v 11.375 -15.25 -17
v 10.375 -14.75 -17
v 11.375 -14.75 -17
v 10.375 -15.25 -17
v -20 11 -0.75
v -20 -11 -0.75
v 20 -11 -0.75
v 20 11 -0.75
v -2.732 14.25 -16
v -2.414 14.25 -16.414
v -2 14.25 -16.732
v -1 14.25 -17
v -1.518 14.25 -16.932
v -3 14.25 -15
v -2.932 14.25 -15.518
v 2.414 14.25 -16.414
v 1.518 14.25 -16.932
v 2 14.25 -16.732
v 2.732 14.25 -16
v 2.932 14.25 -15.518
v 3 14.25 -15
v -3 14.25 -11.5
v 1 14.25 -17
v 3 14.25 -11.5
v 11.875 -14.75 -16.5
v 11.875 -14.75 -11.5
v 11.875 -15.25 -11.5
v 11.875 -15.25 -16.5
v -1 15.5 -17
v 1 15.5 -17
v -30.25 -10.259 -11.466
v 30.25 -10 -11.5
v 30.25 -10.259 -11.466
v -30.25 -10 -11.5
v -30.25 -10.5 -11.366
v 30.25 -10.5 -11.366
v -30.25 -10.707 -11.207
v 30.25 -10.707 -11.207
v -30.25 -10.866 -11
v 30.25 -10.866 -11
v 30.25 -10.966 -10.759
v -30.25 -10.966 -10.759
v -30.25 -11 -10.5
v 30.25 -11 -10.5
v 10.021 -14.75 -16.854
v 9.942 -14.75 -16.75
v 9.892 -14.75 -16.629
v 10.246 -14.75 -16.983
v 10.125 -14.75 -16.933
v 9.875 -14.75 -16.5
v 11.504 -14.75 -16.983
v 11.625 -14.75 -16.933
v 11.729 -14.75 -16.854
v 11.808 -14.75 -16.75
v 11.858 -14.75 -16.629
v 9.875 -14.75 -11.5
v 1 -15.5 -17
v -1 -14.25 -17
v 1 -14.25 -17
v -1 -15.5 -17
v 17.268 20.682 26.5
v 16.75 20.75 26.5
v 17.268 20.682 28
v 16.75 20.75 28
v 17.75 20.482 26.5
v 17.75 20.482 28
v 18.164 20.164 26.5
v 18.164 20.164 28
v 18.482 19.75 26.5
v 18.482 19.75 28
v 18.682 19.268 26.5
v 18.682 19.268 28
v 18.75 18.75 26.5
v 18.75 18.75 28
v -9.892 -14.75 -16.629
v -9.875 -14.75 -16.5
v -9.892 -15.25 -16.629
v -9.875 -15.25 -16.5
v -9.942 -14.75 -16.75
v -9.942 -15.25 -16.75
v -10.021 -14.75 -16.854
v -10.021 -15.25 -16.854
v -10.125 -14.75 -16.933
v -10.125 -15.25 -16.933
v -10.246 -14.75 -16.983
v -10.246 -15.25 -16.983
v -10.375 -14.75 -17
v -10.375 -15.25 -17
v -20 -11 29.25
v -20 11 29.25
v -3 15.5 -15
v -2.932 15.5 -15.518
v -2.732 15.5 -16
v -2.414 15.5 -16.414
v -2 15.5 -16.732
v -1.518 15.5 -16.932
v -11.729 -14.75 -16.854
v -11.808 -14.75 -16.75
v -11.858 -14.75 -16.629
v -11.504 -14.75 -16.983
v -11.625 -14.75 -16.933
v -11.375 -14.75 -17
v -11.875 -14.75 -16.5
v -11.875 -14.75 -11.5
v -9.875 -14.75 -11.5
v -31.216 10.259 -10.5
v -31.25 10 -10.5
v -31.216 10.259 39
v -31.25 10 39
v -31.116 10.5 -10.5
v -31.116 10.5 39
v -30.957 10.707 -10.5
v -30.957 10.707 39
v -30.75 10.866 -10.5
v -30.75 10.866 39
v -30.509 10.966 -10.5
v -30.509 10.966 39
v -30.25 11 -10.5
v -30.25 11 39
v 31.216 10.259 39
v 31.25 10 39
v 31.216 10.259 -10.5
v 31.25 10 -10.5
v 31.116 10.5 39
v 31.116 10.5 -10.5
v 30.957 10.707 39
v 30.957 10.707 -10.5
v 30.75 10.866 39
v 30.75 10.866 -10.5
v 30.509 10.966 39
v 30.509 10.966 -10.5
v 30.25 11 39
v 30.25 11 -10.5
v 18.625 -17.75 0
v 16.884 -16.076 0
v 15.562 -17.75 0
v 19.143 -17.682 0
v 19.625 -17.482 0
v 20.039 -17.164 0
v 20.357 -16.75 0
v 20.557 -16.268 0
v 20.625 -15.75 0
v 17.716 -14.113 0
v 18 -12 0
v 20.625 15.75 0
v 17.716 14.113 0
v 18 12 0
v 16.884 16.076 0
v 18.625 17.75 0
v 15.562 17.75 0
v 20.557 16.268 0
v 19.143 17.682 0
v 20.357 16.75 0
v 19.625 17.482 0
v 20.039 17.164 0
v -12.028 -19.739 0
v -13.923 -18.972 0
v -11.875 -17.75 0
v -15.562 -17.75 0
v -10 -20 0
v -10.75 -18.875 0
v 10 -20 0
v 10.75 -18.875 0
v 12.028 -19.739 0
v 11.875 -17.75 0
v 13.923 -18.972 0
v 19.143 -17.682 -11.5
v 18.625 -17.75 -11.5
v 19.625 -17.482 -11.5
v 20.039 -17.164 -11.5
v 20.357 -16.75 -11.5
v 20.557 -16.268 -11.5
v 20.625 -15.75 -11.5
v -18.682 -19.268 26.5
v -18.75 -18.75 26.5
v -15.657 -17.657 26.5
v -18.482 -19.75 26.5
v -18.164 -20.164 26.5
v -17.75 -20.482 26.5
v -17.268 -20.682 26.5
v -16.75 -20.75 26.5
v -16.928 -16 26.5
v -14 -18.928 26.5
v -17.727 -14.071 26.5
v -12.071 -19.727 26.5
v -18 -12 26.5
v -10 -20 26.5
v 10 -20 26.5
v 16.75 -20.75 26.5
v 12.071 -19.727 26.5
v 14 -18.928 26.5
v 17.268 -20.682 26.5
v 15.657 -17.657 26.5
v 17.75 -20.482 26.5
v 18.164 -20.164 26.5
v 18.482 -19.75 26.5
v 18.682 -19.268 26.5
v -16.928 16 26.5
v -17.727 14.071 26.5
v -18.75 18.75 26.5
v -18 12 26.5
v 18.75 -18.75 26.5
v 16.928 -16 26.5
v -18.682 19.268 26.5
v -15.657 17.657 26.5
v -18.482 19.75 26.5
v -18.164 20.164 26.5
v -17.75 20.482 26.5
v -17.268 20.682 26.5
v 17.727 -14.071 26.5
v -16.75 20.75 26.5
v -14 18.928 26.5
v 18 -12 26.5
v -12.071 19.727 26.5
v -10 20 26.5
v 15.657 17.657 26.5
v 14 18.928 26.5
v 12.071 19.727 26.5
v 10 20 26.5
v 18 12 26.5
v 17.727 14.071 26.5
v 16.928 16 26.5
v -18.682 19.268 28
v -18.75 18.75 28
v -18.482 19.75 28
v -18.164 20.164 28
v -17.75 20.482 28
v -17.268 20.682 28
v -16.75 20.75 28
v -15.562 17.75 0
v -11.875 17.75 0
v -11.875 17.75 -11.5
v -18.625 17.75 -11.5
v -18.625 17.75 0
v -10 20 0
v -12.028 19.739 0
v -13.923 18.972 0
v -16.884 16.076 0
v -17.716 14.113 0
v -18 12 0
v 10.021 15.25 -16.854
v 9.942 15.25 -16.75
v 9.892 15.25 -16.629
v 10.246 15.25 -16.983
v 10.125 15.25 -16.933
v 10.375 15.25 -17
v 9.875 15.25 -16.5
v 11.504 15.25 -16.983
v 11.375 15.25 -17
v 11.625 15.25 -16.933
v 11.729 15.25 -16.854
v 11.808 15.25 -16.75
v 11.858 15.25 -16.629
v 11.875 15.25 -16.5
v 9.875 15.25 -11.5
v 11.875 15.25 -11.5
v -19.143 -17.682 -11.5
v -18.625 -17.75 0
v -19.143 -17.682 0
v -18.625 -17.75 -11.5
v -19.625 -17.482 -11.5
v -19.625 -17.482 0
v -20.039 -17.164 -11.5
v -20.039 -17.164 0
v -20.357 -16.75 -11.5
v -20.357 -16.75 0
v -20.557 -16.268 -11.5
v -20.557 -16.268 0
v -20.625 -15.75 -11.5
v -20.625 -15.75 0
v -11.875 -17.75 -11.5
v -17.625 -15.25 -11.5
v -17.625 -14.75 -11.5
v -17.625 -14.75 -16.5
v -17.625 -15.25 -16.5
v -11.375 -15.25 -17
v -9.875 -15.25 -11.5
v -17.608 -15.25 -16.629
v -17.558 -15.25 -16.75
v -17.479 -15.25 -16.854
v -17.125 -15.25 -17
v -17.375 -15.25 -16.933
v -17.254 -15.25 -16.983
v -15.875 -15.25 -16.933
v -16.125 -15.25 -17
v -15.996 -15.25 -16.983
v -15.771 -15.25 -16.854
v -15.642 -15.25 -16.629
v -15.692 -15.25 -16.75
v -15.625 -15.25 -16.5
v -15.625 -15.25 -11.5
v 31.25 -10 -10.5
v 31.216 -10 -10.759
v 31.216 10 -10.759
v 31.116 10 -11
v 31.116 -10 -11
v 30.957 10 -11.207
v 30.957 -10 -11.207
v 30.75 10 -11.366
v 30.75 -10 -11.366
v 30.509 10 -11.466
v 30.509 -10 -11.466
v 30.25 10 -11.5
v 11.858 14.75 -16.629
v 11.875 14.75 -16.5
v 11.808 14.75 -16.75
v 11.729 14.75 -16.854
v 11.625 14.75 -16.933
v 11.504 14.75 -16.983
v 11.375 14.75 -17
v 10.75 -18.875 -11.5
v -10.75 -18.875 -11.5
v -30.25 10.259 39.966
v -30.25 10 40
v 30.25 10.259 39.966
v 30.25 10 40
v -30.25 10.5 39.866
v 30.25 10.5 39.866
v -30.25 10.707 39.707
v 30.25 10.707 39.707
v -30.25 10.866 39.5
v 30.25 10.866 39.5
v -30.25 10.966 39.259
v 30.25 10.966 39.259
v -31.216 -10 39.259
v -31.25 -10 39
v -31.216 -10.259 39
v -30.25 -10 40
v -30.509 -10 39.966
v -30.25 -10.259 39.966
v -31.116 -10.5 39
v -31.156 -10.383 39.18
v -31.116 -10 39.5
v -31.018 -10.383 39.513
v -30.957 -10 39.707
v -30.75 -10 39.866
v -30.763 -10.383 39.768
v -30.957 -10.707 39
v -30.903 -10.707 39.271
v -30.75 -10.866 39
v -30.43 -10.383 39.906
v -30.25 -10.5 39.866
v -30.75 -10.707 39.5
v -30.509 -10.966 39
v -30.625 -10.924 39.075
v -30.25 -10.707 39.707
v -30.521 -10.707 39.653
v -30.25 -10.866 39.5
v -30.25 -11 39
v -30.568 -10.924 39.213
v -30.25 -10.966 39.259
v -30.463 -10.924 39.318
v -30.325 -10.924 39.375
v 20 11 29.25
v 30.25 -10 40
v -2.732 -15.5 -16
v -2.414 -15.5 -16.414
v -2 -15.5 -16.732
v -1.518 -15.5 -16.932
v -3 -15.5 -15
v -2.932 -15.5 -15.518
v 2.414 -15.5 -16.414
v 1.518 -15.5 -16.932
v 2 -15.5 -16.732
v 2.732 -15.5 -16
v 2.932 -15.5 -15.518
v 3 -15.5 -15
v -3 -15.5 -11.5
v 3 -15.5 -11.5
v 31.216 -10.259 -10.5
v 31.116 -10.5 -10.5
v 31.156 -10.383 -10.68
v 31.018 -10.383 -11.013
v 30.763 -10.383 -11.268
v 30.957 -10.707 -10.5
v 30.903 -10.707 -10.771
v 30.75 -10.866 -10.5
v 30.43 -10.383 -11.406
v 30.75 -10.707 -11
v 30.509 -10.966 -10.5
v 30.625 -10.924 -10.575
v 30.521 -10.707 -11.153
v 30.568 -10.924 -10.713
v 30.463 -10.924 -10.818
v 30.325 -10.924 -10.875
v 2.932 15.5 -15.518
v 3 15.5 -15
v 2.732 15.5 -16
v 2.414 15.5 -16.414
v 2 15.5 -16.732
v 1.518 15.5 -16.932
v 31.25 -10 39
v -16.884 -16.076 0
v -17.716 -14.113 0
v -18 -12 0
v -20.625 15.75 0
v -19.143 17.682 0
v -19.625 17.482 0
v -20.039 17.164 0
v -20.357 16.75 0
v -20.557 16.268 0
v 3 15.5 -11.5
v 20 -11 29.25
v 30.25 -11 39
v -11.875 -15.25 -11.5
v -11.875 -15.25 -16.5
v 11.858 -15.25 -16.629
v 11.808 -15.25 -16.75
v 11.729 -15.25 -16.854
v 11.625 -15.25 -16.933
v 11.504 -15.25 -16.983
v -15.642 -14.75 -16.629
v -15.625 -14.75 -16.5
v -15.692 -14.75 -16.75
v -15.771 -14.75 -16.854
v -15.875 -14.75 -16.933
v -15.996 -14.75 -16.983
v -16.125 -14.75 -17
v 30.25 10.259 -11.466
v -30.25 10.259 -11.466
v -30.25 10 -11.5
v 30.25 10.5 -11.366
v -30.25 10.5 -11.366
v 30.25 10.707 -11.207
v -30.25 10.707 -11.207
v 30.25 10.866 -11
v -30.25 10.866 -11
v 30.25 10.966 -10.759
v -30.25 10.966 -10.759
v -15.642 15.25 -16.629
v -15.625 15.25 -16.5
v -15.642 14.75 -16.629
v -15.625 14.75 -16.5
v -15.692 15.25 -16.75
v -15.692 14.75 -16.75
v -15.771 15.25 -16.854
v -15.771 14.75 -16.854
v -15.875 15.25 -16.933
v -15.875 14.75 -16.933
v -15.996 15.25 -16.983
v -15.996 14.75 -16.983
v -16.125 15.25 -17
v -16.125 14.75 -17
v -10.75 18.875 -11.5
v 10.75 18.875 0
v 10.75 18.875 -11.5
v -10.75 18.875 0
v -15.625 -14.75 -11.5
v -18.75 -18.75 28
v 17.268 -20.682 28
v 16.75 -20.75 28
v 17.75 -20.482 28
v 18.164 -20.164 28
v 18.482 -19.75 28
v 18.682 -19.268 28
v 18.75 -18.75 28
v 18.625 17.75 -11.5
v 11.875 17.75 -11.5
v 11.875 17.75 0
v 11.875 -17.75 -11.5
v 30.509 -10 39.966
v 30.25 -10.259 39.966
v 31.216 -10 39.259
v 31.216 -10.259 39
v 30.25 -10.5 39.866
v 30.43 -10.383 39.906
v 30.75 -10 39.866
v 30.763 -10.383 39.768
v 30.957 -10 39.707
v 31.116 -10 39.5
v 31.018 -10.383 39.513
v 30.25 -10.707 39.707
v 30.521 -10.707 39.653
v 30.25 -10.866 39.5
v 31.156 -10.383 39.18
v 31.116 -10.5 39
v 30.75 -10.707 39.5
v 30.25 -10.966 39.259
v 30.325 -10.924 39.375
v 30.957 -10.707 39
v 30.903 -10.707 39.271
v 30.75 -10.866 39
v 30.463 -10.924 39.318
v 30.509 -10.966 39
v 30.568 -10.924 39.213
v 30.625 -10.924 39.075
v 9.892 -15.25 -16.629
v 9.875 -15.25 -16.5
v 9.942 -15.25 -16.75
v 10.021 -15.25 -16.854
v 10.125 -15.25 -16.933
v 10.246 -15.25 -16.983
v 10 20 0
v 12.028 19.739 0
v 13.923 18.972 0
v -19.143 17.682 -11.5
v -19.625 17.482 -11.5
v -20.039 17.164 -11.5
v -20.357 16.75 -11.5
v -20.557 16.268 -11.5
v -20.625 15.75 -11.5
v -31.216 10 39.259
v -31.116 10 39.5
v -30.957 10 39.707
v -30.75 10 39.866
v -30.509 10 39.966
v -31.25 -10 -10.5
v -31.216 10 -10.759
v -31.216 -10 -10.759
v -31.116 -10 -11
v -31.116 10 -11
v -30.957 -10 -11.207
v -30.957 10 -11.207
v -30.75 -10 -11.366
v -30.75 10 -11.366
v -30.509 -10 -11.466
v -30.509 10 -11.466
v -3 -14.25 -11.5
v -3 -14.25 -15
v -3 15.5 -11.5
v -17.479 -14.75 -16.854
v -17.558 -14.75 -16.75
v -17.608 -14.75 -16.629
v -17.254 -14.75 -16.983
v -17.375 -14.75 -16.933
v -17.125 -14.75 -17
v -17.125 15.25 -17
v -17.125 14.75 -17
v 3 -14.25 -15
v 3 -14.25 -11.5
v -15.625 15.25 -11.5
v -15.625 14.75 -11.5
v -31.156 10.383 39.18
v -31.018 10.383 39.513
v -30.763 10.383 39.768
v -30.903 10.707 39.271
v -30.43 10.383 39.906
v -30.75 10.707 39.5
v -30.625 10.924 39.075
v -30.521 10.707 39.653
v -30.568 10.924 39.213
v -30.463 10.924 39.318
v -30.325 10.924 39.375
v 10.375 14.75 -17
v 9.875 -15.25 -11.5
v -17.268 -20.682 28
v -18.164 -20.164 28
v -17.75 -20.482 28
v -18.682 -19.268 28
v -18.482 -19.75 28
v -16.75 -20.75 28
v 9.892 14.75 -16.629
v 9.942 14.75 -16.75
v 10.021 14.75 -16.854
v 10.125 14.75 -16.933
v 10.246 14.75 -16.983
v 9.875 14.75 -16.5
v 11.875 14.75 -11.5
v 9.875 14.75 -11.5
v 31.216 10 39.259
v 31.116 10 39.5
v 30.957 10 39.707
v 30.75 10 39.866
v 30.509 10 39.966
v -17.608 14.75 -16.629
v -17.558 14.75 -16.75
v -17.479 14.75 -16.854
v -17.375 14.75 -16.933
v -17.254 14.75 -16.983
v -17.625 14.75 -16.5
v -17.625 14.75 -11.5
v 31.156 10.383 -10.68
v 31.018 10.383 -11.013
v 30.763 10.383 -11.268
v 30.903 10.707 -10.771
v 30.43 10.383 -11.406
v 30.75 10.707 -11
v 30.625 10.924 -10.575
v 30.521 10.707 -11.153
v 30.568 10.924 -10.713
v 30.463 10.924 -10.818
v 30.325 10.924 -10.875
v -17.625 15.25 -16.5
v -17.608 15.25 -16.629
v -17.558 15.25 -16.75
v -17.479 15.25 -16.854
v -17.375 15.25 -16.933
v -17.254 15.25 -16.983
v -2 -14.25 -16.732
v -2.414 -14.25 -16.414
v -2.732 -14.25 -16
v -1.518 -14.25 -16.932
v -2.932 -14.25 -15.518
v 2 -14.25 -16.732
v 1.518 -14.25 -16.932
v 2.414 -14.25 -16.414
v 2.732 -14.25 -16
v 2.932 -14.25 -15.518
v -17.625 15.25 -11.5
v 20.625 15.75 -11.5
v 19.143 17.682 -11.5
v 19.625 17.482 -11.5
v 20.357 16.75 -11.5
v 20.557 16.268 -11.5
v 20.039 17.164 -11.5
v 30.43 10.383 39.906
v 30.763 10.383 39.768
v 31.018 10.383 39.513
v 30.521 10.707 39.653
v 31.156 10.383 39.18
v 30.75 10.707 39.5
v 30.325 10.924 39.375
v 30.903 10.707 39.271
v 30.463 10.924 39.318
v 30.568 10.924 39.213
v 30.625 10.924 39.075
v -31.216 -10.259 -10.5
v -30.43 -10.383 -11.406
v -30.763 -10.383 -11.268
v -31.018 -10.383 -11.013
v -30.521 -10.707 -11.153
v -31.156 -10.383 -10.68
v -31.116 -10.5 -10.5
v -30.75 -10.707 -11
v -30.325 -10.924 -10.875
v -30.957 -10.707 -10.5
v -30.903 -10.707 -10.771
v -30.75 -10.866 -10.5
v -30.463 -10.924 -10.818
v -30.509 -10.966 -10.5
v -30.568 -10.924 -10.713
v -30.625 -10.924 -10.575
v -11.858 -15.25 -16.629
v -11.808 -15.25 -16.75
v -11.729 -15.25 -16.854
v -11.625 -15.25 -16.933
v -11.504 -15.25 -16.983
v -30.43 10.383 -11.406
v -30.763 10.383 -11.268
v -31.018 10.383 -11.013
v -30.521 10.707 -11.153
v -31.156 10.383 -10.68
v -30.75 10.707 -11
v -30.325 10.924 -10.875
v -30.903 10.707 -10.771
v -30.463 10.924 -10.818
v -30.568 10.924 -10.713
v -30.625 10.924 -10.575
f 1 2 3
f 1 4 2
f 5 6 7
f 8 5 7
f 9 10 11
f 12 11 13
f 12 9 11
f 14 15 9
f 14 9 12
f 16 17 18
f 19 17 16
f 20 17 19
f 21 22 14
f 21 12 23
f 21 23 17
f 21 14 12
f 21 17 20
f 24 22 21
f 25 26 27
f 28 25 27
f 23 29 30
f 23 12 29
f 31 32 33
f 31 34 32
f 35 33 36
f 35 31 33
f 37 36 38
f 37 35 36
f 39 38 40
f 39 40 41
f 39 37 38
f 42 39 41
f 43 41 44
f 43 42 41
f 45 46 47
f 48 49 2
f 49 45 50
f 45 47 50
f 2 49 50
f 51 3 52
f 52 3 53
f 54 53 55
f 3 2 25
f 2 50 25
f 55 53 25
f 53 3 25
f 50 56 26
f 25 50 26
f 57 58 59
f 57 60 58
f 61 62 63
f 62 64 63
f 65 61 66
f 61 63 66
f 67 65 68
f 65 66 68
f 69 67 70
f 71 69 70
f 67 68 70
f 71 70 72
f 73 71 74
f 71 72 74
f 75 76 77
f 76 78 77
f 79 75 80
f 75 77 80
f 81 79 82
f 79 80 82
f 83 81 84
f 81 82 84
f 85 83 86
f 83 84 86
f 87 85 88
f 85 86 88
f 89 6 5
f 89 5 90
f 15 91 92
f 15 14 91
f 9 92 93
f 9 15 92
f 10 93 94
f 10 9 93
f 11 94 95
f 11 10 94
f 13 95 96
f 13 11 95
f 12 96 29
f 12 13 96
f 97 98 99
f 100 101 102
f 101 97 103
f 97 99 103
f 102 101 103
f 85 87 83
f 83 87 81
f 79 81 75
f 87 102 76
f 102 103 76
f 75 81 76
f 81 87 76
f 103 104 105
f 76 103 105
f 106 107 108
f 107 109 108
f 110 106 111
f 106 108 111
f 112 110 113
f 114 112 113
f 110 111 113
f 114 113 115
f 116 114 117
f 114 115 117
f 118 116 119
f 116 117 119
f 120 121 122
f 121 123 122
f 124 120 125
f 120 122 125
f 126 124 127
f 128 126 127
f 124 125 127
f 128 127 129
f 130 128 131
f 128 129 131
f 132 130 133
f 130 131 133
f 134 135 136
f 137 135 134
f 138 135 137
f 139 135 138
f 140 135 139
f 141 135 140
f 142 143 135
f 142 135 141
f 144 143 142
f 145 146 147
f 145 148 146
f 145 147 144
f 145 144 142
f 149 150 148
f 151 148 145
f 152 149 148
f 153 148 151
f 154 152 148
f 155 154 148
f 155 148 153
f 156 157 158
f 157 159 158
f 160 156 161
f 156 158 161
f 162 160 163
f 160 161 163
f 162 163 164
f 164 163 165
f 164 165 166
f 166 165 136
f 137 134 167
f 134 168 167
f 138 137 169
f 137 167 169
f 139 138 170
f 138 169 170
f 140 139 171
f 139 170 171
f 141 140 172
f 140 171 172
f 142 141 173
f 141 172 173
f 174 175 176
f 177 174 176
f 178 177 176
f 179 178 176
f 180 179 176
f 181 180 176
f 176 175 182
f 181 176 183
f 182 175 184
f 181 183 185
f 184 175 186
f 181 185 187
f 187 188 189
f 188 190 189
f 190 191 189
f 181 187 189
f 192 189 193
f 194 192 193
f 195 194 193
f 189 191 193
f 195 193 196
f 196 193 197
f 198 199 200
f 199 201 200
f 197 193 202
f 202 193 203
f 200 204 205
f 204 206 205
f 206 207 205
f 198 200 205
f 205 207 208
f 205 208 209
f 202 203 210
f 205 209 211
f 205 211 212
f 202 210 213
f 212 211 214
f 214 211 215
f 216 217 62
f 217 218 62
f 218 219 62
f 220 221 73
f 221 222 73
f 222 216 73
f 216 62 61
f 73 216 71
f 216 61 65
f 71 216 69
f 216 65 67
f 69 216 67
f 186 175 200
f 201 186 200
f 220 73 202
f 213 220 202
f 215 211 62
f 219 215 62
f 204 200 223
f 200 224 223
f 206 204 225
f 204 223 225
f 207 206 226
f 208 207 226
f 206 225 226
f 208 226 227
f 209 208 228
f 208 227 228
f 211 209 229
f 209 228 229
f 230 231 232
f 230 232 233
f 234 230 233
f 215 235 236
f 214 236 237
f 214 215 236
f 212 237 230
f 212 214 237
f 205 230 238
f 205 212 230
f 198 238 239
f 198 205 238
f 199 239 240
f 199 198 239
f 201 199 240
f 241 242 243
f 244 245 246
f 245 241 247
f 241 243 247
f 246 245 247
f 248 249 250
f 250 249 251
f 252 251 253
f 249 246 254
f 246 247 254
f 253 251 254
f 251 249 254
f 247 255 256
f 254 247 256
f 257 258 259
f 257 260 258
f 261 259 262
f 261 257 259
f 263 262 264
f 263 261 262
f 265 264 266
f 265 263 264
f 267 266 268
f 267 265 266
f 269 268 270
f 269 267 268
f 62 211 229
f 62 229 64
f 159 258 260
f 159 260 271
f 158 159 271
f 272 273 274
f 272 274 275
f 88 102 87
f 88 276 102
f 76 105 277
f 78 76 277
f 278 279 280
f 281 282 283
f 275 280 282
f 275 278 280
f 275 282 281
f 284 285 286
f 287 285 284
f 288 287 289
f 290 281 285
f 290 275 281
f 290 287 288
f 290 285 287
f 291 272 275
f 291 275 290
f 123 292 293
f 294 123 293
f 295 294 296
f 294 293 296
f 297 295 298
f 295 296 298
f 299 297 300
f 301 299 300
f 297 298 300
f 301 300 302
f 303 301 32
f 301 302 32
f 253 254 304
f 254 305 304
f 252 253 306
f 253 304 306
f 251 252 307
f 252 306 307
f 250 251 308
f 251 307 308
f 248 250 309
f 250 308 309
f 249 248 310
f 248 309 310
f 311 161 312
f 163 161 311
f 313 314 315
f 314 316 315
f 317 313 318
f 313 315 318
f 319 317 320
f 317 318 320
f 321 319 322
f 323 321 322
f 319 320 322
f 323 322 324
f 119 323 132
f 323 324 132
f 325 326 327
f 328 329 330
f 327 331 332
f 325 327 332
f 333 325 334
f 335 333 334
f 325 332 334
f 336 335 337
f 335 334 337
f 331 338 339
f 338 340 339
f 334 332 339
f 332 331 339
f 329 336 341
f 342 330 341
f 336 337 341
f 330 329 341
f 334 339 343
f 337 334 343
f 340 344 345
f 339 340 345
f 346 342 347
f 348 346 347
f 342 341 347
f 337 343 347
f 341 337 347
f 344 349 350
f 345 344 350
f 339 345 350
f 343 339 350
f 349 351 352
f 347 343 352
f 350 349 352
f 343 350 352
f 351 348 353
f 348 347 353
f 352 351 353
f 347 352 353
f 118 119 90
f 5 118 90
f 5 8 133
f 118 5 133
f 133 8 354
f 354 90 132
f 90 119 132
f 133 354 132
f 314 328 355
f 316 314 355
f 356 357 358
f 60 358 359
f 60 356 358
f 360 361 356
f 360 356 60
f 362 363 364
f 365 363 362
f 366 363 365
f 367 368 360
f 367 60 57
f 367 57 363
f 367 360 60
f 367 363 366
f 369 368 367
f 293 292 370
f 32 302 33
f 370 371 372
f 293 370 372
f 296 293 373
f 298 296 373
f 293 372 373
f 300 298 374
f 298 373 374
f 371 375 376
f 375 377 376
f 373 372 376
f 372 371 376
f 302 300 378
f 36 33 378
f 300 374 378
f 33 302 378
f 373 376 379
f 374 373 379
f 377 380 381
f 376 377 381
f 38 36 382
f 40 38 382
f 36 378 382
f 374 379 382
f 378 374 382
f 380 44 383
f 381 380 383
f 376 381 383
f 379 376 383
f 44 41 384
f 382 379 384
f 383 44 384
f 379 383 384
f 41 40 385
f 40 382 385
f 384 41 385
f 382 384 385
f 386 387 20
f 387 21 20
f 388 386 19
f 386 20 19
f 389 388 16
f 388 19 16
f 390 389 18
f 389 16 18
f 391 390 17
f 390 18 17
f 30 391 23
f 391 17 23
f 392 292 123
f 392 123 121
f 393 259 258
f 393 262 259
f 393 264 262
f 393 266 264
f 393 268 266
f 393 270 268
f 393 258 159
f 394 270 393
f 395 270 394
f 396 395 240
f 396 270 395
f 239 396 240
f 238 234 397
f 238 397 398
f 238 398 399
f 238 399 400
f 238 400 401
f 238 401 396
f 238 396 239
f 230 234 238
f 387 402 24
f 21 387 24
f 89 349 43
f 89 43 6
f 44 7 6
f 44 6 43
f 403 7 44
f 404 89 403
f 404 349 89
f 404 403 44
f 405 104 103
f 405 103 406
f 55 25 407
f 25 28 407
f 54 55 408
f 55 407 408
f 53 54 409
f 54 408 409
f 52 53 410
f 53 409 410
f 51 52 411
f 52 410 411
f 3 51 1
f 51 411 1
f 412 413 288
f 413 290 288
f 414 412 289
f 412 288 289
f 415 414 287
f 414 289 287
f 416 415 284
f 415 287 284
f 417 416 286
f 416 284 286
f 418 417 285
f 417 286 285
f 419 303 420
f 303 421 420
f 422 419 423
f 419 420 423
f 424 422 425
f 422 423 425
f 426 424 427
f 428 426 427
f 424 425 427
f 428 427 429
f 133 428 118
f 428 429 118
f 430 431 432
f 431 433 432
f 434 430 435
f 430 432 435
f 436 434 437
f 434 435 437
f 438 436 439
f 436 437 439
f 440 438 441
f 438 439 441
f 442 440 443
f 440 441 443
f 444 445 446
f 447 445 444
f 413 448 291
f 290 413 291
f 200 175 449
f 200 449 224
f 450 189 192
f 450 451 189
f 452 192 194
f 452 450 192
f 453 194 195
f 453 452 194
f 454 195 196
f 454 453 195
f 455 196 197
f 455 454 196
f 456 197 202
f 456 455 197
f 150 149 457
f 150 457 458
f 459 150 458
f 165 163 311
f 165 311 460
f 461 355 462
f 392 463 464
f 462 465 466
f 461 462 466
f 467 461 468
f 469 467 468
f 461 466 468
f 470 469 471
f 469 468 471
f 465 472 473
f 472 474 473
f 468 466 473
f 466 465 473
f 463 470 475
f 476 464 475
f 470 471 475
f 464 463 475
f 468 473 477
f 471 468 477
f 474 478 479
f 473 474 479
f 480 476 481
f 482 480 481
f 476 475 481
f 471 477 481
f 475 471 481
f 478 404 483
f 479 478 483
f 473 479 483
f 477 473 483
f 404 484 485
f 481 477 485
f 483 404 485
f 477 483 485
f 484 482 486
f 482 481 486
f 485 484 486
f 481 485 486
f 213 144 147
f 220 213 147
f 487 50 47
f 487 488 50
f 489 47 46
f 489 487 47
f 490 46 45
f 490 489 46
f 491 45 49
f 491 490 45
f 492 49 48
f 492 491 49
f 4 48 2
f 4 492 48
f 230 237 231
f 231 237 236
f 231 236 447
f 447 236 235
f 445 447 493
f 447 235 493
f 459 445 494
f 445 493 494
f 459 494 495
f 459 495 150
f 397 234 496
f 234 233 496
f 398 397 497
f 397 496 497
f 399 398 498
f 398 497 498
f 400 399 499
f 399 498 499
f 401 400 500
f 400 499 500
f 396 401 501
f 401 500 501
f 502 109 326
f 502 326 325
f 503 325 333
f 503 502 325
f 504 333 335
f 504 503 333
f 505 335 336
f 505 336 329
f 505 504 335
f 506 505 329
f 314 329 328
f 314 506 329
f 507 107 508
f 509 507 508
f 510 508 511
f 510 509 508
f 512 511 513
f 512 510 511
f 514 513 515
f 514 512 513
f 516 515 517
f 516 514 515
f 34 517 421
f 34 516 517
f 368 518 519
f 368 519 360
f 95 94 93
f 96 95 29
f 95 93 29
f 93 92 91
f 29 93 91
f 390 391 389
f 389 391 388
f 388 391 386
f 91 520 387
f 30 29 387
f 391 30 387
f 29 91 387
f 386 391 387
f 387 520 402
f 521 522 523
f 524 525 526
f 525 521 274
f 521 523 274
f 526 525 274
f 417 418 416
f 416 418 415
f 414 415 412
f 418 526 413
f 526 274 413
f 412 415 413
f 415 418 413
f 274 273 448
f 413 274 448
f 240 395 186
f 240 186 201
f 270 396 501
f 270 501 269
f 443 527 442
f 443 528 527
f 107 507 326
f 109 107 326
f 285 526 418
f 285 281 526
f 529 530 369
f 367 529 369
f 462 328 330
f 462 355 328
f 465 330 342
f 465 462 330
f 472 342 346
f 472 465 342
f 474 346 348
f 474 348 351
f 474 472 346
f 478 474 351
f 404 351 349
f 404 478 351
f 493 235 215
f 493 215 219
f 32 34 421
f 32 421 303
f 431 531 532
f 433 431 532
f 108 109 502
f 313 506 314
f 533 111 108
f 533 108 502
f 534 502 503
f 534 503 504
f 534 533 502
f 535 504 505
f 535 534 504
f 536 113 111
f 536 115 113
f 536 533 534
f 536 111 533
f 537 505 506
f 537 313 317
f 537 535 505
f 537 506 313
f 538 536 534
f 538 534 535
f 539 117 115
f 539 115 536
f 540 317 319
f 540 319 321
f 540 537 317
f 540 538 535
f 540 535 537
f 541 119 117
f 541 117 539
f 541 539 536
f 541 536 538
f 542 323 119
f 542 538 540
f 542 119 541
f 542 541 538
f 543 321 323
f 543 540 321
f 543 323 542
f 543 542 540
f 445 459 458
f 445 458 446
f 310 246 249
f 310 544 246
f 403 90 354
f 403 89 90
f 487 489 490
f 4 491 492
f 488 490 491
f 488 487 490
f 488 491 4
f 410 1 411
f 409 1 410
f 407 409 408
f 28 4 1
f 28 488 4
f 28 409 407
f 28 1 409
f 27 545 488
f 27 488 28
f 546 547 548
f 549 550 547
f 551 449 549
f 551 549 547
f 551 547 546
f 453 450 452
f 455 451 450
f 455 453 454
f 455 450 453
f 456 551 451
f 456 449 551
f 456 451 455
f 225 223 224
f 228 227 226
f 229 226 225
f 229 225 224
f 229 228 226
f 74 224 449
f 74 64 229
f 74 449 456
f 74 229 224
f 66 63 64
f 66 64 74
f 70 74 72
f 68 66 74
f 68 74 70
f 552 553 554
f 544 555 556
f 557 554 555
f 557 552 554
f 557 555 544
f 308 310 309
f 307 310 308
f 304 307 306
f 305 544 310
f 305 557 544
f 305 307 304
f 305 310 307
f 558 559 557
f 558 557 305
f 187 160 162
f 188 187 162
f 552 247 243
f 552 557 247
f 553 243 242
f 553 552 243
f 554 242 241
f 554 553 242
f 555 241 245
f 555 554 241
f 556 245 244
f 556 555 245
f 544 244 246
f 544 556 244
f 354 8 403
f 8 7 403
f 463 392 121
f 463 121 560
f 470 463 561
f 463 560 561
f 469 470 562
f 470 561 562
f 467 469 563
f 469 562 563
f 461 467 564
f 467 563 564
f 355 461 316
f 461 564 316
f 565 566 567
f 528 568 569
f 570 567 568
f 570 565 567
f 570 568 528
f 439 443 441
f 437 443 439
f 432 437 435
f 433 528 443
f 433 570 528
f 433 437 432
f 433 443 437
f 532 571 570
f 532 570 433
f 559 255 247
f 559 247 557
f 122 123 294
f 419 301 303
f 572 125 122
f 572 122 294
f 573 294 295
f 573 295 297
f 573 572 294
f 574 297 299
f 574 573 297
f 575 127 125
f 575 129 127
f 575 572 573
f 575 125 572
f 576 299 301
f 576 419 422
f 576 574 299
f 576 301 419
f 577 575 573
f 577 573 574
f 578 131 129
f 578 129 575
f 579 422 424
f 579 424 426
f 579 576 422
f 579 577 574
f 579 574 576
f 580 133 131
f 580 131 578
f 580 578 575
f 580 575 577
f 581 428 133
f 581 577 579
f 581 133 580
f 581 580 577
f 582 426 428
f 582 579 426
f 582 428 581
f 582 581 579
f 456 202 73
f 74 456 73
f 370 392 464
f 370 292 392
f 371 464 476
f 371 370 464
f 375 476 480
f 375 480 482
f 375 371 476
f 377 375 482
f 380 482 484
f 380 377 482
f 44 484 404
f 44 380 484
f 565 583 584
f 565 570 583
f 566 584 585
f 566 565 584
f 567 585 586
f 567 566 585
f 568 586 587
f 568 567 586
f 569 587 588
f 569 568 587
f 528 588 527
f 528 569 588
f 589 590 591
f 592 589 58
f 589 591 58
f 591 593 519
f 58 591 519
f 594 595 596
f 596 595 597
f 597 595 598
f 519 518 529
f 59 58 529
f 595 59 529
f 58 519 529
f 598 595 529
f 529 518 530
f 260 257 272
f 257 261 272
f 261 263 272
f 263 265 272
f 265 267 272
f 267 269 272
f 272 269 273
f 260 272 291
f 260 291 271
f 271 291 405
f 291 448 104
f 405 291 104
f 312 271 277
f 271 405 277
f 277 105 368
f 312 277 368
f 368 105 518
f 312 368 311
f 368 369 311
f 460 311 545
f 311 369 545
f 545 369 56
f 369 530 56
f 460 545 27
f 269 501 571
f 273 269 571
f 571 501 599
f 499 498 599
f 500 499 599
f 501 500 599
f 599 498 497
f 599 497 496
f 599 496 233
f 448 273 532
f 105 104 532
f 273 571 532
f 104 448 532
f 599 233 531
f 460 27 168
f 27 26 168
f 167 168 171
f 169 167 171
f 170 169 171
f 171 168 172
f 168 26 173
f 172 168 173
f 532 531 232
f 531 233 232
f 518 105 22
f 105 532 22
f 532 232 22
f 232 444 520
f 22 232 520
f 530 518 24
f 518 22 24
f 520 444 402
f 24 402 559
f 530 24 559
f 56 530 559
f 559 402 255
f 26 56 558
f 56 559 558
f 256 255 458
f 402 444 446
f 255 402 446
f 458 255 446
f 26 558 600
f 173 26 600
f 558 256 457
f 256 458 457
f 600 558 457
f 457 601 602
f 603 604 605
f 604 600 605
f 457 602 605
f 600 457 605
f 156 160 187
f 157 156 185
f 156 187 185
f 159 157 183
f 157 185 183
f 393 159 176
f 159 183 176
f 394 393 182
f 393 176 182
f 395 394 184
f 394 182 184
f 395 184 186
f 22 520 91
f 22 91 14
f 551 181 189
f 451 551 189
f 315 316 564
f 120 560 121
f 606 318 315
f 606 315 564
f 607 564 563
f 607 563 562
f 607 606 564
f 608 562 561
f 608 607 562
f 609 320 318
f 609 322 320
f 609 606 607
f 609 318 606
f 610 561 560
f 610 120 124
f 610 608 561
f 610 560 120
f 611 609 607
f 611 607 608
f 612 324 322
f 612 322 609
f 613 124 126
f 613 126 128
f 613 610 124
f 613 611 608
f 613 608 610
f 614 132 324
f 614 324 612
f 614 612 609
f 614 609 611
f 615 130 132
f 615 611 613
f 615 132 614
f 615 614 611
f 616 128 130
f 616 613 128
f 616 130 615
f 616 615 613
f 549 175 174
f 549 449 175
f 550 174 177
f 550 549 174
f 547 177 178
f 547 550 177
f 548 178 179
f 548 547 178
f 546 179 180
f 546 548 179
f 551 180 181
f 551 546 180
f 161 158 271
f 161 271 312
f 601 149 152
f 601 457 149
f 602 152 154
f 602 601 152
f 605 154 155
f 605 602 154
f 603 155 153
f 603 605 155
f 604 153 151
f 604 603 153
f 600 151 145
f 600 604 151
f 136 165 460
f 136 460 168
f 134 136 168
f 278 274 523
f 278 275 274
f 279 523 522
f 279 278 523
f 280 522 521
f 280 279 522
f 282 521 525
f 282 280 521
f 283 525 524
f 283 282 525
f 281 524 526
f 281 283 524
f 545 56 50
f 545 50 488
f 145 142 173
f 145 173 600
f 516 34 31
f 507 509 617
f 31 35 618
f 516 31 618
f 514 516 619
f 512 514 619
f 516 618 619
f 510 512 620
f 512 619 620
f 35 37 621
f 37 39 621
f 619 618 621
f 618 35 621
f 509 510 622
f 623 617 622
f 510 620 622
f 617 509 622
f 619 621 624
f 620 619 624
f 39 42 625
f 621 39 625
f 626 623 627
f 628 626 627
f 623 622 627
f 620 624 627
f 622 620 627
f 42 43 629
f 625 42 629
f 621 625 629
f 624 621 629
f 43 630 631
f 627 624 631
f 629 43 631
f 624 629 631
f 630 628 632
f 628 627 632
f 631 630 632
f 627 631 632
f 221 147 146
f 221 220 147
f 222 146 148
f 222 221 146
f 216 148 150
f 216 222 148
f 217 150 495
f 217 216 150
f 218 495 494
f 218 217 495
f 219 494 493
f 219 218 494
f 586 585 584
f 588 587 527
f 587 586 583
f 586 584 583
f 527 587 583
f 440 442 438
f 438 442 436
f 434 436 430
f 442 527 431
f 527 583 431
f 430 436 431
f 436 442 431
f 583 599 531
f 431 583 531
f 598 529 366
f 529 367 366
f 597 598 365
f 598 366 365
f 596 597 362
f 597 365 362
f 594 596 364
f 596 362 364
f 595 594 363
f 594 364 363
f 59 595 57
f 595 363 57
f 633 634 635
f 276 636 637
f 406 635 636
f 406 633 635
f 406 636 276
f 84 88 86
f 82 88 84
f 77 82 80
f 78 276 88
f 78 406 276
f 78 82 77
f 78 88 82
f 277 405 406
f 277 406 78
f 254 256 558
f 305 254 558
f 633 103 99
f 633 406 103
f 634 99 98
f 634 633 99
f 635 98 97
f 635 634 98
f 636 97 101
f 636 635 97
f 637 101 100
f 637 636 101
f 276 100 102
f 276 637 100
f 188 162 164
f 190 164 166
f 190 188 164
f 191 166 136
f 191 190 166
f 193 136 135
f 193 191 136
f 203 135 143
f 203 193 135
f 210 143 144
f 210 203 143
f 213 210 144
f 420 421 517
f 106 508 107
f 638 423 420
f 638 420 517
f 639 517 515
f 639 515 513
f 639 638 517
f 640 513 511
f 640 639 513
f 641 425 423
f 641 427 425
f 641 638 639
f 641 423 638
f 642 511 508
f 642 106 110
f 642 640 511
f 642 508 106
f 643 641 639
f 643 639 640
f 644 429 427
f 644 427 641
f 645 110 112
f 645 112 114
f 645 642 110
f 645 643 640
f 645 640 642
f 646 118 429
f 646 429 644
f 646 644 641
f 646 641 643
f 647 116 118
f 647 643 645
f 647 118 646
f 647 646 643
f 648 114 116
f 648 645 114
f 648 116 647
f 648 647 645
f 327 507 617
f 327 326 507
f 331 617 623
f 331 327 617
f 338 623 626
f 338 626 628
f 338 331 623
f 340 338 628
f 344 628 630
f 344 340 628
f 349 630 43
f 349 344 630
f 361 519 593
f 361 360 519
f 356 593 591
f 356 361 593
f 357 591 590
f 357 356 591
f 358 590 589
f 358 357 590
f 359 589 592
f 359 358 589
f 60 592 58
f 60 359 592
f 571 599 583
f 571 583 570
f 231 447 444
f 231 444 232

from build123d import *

# Parameters (mm, degrees)
SKETCH001_W       = 36
SKETCH001_H       = 40
PAD001_DEPTH      = 26.5
SKETCH002_W       = 37.5
SKETCH002_H       = 41.5
PAD002_DEPTH      = 1.5
FILLET_R          = 8
PAD_DEPTH         = 11.5
FILLET001_R       = 2
FILLET002_R       = 2
SKETCH005_W       = 2
SKETCH005_H       = 0.5
SKETCH005_W_2     = 6
SKETCH005_H_2     = 1.25
PAD004_DEPTH      = 5.5
FILLET005_R       = 2
FILLET006_R       = 0.5
SKETCH003_W       = 62.5
SKETCH003_H       = 51.5
SKETCH003_W_2     = 40
SKETCH003_H_2     = 30
PAD003_DEPTH      = 11
PAD003_DEPTH_BACK = 11
FILLET003_R       = 1
FILLET004_R       = 1


with BuildPart() as body:
    # Sketch001 → Pad001 (new body)
    with BuildSketch(Plane.XY):
        Rectangle(SKETCH001_W, SKETCH001_H)
    extrude(amount=PAD001_DEPTH)

    # Sketch002 (on Face6 of Pad001) → Pad002 (join)
    with BuildSketch(Plane.XY.offset(26.5)):
        Rectangle(SKETCH002_W, SKETCH002_H)
    extrude(amount=PAD002_DEPTH)

    # Fillet
    fillet_edges = [body.edges().sort_by_distance(p)[0] for p in [
        (-18, -20, 13.25),
        (18, -20, 13.25),
        (-18, 20, 13.25),
        (18, 20, 13.25),
    ]]
    fillet(fillet_edges, radius=FILLET_R)

    # Sketch → Pad (join)
    with BuildSketch(Plane.XY):
        Polygon((-20.625, 17.75), (-20.625, -17.75), (-11.875, -17.75), (-10.75, -18.875), (10.75, -18.875), (11.875, -17.75), (20.625, -17.75), (20.625, 17.75), (11.875, 17.75), (10.75, 18.875), (-10.75, 18.875), (-11.875, 17.75), align=None)
    extrude(amount=-PAD_DEPTH)

    # Fillet001
    fillet001_edges = [body.edges().sort_by_distance(p)[0] for p in [
        (-18.75, 20.75, 27.25),
        (-18.75, -20.75, 27.25),
        (18.75, -20.75, 27.25),
        (18.75, 20.75, 27.25),
    ]]
    fillet(fillet001_edges, radius=FILLET001_R)

    # Fillet002
    fillet002_edges = [body.edges().sort_by_distance(p)[0] for p in [
        (20.625, -17.75, -5.75),
        (20.625, 17.75, -5.75),
        (-20.625, -17.75, -5.75),
        (-20.625, 17.75, -5.75),
    ]]
    fillet(fillet002_edges, radius=FILLET002_R)

    # Sketch005 (on Face11 of Fillet002) → Pad004 (join)
    with BuildSketch(Plane(origin=(0, 0, -11.5), x_dir=(1, 0, 0), z_dir=(0, 0, -1))):
        with Locations((-16.625, 15)):
            Rectangle(SKETCH005_W, SKETCH005_H)
        with Locations((-10.875, 15)):
            Rectangle(SKETCH005_W, SKETCH005_H)
        with Locations((0, 14.875)):
            Rectangle(SKETCH005_W_2, SKETCH005_H_2)
        with Locations((10.875, 15)):
            Rectangle(SKETCH005_W, SKETCH005_H)
        with Locations((-16.625, -15)):
            Rectangle(SKETCH005_W, SKETCH005_H)
        with Locations((10.875, -15)):
            Rectangle(SKETCH005_W, SKETCH005_H)
        with Locations((0, -14.875)):
            Rectangle(SKETCH005_W_2, SKETCH005_H_2)
    extrude(amount=PAD004_DEPTH)

    # Fillet005
    fillet005_edges = [body.edges().sort_by_distance(p)[0] for p in [
        (3, -14.875, -17),
        (-3, -14.875, -17),
        (3, 14.875, -17),
        (-3, 14.875, -17),
    ]]
    fillet(fillet005_edges, radius=FILLET005_R)

    # Fillet006
    fillet006_edges = [body.edges().sort_by_distance(p)[0] for p in [
        (11.875, 15, -17),
        (9.875, 15, -17),
        (-15.625, 15, -17),
        (-17.625, 15, -17),
        (-9.875, -15, -17),
        (-11.875, -15, -17),
        (-15.625, -15, -17),
        (-17.625, -15, -17),
        (11.875, -15, -17),
        (9.875, -15, -17),
    ]]
    fillet(fillet006_edges, radius=FILLET006_R)


with BuildPart() as body001:
    # Sketch003 → Pad003 (new body, two sides)
    with BuildSketch(Plane.XZ) as pad003_sk:
        with Locations((0, 14.25)):
            Rectangle(SKETCH003_W, SKETCH003_H)
        with Locations((0, 14.25)):
            Rectangle(SKETCH003_W_2, SKETCH003_H_2, mode=Mode.SUBTRACT)
    extrude(amount=PAD003_DEPTH)
    extrude(pad003_sk.sketch, amount=-PAD003_DEPTH_BACK)

    # Fillet003
    fillet003_edges = [body001.edges().sort_by_distance(p)[0] for p in [
        (31.25, 0, -11.5),
        (31.25, 0, 40),
        (-31.25, 0, 40),
        (-31.25, 0, -11.5),
    ]]
    fillet(fillet003_edges, radius=FILLET003_R)

    # Fillet004
    fillet004_edges = [body001.edges().sort_by_distance(p)[0] for p in [
        (-31.25, 11, 14.25),
        (-31.25, -11, 14.25),
    ]]
    fillet(fillet004_edges, radius=FILLET004_R)


solid = Compound([body.part, body001.part])
